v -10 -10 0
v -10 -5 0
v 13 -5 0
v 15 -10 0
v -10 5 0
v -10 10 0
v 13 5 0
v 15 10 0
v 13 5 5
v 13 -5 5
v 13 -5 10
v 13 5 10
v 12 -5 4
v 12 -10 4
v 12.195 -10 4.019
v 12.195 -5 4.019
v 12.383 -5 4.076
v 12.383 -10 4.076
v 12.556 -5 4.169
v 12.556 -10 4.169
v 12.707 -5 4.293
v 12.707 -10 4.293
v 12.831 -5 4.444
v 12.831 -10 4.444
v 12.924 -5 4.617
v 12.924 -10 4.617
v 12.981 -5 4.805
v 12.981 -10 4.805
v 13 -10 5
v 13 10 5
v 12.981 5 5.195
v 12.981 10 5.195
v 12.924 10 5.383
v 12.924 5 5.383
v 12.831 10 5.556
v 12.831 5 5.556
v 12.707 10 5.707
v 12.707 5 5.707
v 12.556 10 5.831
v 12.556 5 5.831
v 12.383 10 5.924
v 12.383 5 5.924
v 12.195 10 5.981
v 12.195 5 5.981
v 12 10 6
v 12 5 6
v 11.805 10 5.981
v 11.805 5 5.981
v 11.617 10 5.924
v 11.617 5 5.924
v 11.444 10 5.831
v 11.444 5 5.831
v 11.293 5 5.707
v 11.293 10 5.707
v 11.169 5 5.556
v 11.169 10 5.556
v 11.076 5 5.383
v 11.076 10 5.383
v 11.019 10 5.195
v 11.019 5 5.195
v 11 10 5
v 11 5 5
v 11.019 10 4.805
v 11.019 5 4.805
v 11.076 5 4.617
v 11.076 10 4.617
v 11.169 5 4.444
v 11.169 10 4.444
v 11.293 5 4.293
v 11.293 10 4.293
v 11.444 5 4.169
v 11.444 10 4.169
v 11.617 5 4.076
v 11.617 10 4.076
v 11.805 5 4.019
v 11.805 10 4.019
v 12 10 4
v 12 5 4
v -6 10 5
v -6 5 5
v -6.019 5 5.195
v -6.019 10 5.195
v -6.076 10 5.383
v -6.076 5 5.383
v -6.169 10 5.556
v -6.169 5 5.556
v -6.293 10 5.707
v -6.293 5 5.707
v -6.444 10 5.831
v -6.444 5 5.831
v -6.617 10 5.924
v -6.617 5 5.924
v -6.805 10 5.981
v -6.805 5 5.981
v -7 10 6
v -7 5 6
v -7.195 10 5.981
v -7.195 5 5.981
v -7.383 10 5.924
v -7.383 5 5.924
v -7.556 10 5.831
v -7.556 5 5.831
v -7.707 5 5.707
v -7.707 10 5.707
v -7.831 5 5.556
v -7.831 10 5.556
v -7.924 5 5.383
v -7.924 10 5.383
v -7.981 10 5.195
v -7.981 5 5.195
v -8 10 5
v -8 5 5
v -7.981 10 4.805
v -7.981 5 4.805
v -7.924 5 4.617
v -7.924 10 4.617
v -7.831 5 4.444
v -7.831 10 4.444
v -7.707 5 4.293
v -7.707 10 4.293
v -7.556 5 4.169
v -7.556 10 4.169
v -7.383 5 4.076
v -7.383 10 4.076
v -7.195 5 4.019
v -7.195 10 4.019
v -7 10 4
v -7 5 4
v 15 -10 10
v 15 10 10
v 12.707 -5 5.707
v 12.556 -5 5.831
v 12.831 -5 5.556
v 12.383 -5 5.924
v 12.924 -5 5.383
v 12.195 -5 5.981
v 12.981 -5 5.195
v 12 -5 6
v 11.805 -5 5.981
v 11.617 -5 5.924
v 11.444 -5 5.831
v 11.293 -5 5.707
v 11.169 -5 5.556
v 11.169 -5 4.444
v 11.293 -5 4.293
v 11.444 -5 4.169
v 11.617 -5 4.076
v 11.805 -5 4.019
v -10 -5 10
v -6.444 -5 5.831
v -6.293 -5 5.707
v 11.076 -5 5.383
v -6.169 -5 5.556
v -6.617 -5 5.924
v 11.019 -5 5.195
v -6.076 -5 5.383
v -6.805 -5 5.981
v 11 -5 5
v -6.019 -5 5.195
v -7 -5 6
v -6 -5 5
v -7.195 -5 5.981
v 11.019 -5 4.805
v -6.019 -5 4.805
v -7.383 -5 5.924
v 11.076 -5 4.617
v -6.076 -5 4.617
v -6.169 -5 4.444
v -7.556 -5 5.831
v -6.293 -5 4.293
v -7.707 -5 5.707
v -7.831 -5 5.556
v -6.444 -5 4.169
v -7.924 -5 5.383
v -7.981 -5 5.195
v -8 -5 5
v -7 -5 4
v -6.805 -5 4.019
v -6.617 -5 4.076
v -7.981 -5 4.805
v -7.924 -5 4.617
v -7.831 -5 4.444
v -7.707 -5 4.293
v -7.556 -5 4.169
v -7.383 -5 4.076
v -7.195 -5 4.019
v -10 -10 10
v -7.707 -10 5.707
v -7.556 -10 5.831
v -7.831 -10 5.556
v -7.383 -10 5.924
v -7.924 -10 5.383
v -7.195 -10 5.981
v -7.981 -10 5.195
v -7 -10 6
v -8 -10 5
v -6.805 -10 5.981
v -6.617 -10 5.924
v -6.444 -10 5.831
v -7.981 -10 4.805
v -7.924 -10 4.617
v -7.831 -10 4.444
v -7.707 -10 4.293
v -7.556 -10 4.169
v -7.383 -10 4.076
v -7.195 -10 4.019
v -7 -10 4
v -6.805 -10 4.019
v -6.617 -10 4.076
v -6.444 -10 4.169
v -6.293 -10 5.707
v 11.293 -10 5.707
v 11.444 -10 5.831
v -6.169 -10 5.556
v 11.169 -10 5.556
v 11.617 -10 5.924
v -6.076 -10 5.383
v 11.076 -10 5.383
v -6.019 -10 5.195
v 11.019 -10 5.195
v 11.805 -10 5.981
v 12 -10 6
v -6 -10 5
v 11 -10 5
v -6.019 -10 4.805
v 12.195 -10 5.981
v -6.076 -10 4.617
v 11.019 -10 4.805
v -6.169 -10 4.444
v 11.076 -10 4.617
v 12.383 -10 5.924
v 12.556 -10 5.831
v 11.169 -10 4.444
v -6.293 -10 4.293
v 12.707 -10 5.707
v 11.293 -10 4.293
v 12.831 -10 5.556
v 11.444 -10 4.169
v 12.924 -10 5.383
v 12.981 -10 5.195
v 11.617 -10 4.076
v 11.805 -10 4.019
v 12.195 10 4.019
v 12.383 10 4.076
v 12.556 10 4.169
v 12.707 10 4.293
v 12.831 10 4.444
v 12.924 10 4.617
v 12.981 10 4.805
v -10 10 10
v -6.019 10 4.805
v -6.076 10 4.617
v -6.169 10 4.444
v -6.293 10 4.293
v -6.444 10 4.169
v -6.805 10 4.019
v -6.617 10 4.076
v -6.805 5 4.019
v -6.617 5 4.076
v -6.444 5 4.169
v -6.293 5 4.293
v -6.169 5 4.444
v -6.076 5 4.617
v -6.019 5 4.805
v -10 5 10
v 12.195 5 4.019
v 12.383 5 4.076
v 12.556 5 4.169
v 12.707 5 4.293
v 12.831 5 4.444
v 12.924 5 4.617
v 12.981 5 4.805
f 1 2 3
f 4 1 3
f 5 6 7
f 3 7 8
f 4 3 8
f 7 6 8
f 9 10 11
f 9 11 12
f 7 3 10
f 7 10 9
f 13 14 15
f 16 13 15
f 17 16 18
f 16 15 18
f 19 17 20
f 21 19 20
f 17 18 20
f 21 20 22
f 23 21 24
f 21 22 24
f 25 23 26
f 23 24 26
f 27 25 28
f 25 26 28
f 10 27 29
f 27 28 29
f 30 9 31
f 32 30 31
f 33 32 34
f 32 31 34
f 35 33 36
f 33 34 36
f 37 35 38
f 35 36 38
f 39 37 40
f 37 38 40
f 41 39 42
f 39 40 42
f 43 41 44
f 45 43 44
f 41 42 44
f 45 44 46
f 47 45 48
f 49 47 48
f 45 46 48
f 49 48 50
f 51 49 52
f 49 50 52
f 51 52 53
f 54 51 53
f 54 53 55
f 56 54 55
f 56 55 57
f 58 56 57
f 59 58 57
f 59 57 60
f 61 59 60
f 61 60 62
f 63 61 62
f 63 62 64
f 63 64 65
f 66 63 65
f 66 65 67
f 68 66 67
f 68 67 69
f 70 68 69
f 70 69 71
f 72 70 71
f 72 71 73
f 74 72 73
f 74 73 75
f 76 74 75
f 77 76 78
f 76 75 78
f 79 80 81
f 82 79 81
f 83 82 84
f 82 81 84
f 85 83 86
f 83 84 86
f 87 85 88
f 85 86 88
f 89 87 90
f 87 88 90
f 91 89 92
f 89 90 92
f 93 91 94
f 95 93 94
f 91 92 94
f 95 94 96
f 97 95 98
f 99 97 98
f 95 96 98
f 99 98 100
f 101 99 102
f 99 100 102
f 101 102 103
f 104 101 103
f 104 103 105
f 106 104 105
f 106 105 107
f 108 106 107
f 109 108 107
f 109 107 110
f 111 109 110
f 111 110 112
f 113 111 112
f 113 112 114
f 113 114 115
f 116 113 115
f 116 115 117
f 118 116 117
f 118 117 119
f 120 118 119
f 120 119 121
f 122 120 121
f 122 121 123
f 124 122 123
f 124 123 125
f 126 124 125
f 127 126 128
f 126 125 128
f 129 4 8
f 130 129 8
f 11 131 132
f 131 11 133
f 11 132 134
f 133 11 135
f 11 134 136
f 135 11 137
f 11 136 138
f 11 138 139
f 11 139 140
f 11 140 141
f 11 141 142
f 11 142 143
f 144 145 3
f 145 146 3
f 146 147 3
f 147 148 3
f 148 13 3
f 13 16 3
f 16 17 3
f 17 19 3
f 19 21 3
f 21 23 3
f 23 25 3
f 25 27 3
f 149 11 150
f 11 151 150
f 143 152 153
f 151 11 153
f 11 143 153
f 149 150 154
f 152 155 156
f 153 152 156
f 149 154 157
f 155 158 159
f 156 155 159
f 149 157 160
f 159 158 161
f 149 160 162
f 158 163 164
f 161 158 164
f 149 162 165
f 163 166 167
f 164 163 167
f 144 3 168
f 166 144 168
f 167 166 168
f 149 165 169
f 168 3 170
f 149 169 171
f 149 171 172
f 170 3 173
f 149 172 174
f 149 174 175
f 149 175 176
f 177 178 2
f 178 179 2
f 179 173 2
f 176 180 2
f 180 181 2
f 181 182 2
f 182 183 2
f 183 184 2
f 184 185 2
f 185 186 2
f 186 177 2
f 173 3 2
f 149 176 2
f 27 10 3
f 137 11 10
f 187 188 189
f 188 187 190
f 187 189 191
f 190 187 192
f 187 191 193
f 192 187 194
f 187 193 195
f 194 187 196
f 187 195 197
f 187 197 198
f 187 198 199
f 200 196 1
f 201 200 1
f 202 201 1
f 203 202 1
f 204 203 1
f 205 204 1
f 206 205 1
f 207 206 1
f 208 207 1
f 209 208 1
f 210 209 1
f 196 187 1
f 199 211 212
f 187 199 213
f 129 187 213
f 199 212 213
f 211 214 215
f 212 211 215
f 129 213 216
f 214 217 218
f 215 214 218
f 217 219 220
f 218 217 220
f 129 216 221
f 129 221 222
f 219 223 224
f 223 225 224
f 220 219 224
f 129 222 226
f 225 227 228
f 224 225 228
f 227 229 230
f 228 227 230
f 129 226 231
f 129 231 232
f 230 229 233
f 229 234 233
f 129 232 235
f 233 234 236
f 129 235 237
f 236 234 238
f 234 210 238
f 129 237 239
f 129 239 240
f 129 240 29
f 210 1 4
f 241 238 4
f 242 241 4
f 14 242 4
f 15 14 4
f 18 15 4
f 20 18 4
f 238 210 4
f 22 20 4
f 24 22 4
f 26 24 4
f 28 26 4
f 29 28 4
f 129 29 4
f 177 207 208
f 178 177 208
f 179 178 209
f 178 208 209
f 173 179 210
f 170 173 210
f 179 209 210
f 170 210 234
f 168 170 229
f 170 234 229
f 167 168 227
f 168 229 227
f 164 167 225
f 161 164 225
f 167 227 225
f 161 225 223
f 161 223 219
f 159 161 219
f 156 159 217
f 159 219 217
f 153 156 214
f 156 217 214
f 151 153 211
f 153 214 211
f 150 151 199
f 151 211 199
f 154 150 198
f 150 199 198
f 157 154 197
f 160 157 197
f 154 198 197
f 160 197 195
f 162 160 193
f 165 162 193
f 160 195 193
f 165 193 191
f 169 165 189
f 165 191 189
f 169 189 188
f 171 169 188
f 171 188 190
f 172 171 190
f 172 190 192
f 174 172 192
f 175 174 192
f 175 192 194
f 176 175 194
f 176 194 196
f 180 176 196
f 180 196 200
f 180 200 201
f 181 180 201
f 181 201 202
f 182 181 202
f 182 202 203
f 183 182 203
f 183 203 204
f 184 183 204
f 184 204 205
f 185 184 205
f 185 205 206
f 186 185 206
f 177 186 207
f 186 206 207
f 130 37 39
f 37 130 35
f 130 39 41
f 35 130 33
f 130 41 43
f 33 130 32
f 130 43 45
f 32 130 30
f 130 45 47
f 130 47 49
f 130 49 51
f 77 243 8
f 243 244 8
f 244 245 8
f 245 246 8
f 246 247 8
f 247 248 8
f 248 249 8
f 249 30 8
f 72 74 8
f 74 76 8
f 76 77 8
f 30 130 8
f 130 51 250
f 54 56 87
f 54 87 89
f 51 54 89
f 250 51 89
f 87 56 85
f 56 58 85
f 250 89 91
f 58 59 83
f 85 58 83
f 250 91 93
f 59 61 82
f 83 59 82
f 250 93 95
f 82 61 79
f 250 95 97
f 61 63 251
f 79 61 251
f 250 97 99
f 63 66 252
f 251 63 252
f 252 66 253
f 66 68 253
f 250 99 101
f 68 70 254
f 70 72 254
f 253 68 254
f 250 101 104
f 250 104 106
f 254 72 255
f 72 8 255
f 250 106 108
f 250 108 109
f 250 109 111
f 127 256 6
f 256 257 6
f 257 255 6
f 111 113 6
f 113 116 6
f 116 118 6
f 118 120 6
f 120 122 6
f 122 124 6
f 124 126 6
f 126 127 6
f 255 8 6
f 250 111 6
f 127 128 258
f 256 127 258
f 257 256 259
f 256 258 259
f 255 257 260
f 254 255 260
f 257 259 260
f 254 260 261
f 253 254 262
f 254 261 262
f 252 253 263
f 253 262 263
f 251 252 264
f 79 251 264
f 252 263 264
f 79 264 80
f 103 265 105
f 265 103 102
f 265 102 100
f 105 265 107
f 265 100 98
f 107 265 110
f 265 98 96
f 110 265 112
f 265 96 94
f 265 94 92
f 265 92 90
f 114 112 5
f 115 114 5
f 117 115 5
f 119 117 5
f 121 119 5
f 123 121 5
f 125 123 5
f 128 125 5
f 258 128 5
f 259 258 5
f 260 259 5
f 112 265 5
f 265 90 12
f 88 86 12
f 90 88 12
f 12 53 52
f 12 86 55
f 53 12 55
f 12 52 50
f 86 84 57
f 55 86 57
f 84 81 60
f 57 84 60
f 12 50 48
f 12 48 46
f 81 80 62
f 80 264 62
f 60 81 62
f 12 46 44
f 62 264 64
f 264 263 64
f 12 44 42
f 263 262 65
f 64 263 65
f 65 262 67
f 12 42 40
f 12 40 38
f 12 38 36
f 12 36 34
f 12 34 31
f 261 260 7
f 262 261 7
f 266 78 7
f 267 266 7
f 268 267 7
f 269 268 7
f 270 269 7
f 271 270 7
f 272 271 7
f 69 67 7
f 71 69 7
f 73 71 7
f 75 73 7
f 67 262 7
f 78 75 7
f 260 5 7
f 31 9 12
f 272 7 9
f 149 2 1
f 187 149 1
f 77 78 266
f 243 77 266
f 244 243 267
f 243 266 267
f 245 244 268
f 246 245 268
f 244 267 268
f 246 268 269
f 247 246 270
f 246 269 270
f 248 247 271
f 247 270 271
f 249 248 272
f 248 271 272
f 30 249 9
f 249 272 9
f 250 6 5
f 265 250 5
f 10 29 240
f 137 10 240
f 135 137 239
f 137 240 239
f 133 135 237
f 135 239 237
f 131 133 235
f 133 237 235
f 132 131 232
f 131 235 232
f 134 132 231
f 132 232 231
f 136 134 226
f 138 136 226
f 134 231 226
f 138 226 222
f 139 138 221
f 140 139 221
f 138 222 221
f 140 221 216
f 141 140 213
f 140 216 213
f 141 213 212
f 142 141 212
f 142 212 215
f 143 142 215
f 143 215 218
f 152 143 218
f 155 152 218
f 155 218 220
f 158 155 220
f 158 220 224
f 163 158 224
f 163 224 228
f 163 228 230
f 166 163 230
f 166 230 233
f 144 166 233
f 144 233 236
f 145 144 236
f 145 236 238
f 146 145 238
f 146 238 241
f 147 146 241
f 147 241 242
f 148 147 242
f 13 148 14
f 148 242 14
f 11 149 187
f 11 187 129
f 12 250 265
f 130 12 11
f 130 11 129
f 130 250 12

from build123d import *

# Parameters (mm, degrees)
F0_W     = 2
F0_H     = 10
F1_DEPTH = 10
F3_DEPTH = 20


with BuildPart() as f1:
    # F0 (on Top) → F1 (new body)
    with BuildSketch(Plane.XY):
        Polygon((-1, 5), (0, 5), (1, 5), (13, 5), (15, 5), (15, 10), (-10, 10), (-10, 5), align=None)
        Polygon((1, -5), (0, -5), (-1, -5), (-10, -5), (-10, -10), (15, -10), (15, -5), (13, -5), align=None)
        with Locations((14, 0)):
            Rectangle(F0_W, F0_H)
    extrude(amount=F1_DEPTH)

    # F2 (on face) → F3 (cut)
    with BuildSketch(Plane.XZ.offset(10)):
        with BuildLine():
            ThreePointArc((12, 4), (12.707107, 4.292893), (13, 5))
            ThreePointArc((13, 5), (11.292893, 5.707107), (12, 4))
        make_face()
        with BuildLine():
            ThreePointArc((-7, 4), (-6.292893, 4.292893), (-6, 5))
            ThreePointArc((-6, 5), (-7.707107, 5.707107), (-7, 4))
        make_face()
    extrude(amount=-F3_DEPTH, mode=Mode.SUBTRACT)


solid = f1.part
